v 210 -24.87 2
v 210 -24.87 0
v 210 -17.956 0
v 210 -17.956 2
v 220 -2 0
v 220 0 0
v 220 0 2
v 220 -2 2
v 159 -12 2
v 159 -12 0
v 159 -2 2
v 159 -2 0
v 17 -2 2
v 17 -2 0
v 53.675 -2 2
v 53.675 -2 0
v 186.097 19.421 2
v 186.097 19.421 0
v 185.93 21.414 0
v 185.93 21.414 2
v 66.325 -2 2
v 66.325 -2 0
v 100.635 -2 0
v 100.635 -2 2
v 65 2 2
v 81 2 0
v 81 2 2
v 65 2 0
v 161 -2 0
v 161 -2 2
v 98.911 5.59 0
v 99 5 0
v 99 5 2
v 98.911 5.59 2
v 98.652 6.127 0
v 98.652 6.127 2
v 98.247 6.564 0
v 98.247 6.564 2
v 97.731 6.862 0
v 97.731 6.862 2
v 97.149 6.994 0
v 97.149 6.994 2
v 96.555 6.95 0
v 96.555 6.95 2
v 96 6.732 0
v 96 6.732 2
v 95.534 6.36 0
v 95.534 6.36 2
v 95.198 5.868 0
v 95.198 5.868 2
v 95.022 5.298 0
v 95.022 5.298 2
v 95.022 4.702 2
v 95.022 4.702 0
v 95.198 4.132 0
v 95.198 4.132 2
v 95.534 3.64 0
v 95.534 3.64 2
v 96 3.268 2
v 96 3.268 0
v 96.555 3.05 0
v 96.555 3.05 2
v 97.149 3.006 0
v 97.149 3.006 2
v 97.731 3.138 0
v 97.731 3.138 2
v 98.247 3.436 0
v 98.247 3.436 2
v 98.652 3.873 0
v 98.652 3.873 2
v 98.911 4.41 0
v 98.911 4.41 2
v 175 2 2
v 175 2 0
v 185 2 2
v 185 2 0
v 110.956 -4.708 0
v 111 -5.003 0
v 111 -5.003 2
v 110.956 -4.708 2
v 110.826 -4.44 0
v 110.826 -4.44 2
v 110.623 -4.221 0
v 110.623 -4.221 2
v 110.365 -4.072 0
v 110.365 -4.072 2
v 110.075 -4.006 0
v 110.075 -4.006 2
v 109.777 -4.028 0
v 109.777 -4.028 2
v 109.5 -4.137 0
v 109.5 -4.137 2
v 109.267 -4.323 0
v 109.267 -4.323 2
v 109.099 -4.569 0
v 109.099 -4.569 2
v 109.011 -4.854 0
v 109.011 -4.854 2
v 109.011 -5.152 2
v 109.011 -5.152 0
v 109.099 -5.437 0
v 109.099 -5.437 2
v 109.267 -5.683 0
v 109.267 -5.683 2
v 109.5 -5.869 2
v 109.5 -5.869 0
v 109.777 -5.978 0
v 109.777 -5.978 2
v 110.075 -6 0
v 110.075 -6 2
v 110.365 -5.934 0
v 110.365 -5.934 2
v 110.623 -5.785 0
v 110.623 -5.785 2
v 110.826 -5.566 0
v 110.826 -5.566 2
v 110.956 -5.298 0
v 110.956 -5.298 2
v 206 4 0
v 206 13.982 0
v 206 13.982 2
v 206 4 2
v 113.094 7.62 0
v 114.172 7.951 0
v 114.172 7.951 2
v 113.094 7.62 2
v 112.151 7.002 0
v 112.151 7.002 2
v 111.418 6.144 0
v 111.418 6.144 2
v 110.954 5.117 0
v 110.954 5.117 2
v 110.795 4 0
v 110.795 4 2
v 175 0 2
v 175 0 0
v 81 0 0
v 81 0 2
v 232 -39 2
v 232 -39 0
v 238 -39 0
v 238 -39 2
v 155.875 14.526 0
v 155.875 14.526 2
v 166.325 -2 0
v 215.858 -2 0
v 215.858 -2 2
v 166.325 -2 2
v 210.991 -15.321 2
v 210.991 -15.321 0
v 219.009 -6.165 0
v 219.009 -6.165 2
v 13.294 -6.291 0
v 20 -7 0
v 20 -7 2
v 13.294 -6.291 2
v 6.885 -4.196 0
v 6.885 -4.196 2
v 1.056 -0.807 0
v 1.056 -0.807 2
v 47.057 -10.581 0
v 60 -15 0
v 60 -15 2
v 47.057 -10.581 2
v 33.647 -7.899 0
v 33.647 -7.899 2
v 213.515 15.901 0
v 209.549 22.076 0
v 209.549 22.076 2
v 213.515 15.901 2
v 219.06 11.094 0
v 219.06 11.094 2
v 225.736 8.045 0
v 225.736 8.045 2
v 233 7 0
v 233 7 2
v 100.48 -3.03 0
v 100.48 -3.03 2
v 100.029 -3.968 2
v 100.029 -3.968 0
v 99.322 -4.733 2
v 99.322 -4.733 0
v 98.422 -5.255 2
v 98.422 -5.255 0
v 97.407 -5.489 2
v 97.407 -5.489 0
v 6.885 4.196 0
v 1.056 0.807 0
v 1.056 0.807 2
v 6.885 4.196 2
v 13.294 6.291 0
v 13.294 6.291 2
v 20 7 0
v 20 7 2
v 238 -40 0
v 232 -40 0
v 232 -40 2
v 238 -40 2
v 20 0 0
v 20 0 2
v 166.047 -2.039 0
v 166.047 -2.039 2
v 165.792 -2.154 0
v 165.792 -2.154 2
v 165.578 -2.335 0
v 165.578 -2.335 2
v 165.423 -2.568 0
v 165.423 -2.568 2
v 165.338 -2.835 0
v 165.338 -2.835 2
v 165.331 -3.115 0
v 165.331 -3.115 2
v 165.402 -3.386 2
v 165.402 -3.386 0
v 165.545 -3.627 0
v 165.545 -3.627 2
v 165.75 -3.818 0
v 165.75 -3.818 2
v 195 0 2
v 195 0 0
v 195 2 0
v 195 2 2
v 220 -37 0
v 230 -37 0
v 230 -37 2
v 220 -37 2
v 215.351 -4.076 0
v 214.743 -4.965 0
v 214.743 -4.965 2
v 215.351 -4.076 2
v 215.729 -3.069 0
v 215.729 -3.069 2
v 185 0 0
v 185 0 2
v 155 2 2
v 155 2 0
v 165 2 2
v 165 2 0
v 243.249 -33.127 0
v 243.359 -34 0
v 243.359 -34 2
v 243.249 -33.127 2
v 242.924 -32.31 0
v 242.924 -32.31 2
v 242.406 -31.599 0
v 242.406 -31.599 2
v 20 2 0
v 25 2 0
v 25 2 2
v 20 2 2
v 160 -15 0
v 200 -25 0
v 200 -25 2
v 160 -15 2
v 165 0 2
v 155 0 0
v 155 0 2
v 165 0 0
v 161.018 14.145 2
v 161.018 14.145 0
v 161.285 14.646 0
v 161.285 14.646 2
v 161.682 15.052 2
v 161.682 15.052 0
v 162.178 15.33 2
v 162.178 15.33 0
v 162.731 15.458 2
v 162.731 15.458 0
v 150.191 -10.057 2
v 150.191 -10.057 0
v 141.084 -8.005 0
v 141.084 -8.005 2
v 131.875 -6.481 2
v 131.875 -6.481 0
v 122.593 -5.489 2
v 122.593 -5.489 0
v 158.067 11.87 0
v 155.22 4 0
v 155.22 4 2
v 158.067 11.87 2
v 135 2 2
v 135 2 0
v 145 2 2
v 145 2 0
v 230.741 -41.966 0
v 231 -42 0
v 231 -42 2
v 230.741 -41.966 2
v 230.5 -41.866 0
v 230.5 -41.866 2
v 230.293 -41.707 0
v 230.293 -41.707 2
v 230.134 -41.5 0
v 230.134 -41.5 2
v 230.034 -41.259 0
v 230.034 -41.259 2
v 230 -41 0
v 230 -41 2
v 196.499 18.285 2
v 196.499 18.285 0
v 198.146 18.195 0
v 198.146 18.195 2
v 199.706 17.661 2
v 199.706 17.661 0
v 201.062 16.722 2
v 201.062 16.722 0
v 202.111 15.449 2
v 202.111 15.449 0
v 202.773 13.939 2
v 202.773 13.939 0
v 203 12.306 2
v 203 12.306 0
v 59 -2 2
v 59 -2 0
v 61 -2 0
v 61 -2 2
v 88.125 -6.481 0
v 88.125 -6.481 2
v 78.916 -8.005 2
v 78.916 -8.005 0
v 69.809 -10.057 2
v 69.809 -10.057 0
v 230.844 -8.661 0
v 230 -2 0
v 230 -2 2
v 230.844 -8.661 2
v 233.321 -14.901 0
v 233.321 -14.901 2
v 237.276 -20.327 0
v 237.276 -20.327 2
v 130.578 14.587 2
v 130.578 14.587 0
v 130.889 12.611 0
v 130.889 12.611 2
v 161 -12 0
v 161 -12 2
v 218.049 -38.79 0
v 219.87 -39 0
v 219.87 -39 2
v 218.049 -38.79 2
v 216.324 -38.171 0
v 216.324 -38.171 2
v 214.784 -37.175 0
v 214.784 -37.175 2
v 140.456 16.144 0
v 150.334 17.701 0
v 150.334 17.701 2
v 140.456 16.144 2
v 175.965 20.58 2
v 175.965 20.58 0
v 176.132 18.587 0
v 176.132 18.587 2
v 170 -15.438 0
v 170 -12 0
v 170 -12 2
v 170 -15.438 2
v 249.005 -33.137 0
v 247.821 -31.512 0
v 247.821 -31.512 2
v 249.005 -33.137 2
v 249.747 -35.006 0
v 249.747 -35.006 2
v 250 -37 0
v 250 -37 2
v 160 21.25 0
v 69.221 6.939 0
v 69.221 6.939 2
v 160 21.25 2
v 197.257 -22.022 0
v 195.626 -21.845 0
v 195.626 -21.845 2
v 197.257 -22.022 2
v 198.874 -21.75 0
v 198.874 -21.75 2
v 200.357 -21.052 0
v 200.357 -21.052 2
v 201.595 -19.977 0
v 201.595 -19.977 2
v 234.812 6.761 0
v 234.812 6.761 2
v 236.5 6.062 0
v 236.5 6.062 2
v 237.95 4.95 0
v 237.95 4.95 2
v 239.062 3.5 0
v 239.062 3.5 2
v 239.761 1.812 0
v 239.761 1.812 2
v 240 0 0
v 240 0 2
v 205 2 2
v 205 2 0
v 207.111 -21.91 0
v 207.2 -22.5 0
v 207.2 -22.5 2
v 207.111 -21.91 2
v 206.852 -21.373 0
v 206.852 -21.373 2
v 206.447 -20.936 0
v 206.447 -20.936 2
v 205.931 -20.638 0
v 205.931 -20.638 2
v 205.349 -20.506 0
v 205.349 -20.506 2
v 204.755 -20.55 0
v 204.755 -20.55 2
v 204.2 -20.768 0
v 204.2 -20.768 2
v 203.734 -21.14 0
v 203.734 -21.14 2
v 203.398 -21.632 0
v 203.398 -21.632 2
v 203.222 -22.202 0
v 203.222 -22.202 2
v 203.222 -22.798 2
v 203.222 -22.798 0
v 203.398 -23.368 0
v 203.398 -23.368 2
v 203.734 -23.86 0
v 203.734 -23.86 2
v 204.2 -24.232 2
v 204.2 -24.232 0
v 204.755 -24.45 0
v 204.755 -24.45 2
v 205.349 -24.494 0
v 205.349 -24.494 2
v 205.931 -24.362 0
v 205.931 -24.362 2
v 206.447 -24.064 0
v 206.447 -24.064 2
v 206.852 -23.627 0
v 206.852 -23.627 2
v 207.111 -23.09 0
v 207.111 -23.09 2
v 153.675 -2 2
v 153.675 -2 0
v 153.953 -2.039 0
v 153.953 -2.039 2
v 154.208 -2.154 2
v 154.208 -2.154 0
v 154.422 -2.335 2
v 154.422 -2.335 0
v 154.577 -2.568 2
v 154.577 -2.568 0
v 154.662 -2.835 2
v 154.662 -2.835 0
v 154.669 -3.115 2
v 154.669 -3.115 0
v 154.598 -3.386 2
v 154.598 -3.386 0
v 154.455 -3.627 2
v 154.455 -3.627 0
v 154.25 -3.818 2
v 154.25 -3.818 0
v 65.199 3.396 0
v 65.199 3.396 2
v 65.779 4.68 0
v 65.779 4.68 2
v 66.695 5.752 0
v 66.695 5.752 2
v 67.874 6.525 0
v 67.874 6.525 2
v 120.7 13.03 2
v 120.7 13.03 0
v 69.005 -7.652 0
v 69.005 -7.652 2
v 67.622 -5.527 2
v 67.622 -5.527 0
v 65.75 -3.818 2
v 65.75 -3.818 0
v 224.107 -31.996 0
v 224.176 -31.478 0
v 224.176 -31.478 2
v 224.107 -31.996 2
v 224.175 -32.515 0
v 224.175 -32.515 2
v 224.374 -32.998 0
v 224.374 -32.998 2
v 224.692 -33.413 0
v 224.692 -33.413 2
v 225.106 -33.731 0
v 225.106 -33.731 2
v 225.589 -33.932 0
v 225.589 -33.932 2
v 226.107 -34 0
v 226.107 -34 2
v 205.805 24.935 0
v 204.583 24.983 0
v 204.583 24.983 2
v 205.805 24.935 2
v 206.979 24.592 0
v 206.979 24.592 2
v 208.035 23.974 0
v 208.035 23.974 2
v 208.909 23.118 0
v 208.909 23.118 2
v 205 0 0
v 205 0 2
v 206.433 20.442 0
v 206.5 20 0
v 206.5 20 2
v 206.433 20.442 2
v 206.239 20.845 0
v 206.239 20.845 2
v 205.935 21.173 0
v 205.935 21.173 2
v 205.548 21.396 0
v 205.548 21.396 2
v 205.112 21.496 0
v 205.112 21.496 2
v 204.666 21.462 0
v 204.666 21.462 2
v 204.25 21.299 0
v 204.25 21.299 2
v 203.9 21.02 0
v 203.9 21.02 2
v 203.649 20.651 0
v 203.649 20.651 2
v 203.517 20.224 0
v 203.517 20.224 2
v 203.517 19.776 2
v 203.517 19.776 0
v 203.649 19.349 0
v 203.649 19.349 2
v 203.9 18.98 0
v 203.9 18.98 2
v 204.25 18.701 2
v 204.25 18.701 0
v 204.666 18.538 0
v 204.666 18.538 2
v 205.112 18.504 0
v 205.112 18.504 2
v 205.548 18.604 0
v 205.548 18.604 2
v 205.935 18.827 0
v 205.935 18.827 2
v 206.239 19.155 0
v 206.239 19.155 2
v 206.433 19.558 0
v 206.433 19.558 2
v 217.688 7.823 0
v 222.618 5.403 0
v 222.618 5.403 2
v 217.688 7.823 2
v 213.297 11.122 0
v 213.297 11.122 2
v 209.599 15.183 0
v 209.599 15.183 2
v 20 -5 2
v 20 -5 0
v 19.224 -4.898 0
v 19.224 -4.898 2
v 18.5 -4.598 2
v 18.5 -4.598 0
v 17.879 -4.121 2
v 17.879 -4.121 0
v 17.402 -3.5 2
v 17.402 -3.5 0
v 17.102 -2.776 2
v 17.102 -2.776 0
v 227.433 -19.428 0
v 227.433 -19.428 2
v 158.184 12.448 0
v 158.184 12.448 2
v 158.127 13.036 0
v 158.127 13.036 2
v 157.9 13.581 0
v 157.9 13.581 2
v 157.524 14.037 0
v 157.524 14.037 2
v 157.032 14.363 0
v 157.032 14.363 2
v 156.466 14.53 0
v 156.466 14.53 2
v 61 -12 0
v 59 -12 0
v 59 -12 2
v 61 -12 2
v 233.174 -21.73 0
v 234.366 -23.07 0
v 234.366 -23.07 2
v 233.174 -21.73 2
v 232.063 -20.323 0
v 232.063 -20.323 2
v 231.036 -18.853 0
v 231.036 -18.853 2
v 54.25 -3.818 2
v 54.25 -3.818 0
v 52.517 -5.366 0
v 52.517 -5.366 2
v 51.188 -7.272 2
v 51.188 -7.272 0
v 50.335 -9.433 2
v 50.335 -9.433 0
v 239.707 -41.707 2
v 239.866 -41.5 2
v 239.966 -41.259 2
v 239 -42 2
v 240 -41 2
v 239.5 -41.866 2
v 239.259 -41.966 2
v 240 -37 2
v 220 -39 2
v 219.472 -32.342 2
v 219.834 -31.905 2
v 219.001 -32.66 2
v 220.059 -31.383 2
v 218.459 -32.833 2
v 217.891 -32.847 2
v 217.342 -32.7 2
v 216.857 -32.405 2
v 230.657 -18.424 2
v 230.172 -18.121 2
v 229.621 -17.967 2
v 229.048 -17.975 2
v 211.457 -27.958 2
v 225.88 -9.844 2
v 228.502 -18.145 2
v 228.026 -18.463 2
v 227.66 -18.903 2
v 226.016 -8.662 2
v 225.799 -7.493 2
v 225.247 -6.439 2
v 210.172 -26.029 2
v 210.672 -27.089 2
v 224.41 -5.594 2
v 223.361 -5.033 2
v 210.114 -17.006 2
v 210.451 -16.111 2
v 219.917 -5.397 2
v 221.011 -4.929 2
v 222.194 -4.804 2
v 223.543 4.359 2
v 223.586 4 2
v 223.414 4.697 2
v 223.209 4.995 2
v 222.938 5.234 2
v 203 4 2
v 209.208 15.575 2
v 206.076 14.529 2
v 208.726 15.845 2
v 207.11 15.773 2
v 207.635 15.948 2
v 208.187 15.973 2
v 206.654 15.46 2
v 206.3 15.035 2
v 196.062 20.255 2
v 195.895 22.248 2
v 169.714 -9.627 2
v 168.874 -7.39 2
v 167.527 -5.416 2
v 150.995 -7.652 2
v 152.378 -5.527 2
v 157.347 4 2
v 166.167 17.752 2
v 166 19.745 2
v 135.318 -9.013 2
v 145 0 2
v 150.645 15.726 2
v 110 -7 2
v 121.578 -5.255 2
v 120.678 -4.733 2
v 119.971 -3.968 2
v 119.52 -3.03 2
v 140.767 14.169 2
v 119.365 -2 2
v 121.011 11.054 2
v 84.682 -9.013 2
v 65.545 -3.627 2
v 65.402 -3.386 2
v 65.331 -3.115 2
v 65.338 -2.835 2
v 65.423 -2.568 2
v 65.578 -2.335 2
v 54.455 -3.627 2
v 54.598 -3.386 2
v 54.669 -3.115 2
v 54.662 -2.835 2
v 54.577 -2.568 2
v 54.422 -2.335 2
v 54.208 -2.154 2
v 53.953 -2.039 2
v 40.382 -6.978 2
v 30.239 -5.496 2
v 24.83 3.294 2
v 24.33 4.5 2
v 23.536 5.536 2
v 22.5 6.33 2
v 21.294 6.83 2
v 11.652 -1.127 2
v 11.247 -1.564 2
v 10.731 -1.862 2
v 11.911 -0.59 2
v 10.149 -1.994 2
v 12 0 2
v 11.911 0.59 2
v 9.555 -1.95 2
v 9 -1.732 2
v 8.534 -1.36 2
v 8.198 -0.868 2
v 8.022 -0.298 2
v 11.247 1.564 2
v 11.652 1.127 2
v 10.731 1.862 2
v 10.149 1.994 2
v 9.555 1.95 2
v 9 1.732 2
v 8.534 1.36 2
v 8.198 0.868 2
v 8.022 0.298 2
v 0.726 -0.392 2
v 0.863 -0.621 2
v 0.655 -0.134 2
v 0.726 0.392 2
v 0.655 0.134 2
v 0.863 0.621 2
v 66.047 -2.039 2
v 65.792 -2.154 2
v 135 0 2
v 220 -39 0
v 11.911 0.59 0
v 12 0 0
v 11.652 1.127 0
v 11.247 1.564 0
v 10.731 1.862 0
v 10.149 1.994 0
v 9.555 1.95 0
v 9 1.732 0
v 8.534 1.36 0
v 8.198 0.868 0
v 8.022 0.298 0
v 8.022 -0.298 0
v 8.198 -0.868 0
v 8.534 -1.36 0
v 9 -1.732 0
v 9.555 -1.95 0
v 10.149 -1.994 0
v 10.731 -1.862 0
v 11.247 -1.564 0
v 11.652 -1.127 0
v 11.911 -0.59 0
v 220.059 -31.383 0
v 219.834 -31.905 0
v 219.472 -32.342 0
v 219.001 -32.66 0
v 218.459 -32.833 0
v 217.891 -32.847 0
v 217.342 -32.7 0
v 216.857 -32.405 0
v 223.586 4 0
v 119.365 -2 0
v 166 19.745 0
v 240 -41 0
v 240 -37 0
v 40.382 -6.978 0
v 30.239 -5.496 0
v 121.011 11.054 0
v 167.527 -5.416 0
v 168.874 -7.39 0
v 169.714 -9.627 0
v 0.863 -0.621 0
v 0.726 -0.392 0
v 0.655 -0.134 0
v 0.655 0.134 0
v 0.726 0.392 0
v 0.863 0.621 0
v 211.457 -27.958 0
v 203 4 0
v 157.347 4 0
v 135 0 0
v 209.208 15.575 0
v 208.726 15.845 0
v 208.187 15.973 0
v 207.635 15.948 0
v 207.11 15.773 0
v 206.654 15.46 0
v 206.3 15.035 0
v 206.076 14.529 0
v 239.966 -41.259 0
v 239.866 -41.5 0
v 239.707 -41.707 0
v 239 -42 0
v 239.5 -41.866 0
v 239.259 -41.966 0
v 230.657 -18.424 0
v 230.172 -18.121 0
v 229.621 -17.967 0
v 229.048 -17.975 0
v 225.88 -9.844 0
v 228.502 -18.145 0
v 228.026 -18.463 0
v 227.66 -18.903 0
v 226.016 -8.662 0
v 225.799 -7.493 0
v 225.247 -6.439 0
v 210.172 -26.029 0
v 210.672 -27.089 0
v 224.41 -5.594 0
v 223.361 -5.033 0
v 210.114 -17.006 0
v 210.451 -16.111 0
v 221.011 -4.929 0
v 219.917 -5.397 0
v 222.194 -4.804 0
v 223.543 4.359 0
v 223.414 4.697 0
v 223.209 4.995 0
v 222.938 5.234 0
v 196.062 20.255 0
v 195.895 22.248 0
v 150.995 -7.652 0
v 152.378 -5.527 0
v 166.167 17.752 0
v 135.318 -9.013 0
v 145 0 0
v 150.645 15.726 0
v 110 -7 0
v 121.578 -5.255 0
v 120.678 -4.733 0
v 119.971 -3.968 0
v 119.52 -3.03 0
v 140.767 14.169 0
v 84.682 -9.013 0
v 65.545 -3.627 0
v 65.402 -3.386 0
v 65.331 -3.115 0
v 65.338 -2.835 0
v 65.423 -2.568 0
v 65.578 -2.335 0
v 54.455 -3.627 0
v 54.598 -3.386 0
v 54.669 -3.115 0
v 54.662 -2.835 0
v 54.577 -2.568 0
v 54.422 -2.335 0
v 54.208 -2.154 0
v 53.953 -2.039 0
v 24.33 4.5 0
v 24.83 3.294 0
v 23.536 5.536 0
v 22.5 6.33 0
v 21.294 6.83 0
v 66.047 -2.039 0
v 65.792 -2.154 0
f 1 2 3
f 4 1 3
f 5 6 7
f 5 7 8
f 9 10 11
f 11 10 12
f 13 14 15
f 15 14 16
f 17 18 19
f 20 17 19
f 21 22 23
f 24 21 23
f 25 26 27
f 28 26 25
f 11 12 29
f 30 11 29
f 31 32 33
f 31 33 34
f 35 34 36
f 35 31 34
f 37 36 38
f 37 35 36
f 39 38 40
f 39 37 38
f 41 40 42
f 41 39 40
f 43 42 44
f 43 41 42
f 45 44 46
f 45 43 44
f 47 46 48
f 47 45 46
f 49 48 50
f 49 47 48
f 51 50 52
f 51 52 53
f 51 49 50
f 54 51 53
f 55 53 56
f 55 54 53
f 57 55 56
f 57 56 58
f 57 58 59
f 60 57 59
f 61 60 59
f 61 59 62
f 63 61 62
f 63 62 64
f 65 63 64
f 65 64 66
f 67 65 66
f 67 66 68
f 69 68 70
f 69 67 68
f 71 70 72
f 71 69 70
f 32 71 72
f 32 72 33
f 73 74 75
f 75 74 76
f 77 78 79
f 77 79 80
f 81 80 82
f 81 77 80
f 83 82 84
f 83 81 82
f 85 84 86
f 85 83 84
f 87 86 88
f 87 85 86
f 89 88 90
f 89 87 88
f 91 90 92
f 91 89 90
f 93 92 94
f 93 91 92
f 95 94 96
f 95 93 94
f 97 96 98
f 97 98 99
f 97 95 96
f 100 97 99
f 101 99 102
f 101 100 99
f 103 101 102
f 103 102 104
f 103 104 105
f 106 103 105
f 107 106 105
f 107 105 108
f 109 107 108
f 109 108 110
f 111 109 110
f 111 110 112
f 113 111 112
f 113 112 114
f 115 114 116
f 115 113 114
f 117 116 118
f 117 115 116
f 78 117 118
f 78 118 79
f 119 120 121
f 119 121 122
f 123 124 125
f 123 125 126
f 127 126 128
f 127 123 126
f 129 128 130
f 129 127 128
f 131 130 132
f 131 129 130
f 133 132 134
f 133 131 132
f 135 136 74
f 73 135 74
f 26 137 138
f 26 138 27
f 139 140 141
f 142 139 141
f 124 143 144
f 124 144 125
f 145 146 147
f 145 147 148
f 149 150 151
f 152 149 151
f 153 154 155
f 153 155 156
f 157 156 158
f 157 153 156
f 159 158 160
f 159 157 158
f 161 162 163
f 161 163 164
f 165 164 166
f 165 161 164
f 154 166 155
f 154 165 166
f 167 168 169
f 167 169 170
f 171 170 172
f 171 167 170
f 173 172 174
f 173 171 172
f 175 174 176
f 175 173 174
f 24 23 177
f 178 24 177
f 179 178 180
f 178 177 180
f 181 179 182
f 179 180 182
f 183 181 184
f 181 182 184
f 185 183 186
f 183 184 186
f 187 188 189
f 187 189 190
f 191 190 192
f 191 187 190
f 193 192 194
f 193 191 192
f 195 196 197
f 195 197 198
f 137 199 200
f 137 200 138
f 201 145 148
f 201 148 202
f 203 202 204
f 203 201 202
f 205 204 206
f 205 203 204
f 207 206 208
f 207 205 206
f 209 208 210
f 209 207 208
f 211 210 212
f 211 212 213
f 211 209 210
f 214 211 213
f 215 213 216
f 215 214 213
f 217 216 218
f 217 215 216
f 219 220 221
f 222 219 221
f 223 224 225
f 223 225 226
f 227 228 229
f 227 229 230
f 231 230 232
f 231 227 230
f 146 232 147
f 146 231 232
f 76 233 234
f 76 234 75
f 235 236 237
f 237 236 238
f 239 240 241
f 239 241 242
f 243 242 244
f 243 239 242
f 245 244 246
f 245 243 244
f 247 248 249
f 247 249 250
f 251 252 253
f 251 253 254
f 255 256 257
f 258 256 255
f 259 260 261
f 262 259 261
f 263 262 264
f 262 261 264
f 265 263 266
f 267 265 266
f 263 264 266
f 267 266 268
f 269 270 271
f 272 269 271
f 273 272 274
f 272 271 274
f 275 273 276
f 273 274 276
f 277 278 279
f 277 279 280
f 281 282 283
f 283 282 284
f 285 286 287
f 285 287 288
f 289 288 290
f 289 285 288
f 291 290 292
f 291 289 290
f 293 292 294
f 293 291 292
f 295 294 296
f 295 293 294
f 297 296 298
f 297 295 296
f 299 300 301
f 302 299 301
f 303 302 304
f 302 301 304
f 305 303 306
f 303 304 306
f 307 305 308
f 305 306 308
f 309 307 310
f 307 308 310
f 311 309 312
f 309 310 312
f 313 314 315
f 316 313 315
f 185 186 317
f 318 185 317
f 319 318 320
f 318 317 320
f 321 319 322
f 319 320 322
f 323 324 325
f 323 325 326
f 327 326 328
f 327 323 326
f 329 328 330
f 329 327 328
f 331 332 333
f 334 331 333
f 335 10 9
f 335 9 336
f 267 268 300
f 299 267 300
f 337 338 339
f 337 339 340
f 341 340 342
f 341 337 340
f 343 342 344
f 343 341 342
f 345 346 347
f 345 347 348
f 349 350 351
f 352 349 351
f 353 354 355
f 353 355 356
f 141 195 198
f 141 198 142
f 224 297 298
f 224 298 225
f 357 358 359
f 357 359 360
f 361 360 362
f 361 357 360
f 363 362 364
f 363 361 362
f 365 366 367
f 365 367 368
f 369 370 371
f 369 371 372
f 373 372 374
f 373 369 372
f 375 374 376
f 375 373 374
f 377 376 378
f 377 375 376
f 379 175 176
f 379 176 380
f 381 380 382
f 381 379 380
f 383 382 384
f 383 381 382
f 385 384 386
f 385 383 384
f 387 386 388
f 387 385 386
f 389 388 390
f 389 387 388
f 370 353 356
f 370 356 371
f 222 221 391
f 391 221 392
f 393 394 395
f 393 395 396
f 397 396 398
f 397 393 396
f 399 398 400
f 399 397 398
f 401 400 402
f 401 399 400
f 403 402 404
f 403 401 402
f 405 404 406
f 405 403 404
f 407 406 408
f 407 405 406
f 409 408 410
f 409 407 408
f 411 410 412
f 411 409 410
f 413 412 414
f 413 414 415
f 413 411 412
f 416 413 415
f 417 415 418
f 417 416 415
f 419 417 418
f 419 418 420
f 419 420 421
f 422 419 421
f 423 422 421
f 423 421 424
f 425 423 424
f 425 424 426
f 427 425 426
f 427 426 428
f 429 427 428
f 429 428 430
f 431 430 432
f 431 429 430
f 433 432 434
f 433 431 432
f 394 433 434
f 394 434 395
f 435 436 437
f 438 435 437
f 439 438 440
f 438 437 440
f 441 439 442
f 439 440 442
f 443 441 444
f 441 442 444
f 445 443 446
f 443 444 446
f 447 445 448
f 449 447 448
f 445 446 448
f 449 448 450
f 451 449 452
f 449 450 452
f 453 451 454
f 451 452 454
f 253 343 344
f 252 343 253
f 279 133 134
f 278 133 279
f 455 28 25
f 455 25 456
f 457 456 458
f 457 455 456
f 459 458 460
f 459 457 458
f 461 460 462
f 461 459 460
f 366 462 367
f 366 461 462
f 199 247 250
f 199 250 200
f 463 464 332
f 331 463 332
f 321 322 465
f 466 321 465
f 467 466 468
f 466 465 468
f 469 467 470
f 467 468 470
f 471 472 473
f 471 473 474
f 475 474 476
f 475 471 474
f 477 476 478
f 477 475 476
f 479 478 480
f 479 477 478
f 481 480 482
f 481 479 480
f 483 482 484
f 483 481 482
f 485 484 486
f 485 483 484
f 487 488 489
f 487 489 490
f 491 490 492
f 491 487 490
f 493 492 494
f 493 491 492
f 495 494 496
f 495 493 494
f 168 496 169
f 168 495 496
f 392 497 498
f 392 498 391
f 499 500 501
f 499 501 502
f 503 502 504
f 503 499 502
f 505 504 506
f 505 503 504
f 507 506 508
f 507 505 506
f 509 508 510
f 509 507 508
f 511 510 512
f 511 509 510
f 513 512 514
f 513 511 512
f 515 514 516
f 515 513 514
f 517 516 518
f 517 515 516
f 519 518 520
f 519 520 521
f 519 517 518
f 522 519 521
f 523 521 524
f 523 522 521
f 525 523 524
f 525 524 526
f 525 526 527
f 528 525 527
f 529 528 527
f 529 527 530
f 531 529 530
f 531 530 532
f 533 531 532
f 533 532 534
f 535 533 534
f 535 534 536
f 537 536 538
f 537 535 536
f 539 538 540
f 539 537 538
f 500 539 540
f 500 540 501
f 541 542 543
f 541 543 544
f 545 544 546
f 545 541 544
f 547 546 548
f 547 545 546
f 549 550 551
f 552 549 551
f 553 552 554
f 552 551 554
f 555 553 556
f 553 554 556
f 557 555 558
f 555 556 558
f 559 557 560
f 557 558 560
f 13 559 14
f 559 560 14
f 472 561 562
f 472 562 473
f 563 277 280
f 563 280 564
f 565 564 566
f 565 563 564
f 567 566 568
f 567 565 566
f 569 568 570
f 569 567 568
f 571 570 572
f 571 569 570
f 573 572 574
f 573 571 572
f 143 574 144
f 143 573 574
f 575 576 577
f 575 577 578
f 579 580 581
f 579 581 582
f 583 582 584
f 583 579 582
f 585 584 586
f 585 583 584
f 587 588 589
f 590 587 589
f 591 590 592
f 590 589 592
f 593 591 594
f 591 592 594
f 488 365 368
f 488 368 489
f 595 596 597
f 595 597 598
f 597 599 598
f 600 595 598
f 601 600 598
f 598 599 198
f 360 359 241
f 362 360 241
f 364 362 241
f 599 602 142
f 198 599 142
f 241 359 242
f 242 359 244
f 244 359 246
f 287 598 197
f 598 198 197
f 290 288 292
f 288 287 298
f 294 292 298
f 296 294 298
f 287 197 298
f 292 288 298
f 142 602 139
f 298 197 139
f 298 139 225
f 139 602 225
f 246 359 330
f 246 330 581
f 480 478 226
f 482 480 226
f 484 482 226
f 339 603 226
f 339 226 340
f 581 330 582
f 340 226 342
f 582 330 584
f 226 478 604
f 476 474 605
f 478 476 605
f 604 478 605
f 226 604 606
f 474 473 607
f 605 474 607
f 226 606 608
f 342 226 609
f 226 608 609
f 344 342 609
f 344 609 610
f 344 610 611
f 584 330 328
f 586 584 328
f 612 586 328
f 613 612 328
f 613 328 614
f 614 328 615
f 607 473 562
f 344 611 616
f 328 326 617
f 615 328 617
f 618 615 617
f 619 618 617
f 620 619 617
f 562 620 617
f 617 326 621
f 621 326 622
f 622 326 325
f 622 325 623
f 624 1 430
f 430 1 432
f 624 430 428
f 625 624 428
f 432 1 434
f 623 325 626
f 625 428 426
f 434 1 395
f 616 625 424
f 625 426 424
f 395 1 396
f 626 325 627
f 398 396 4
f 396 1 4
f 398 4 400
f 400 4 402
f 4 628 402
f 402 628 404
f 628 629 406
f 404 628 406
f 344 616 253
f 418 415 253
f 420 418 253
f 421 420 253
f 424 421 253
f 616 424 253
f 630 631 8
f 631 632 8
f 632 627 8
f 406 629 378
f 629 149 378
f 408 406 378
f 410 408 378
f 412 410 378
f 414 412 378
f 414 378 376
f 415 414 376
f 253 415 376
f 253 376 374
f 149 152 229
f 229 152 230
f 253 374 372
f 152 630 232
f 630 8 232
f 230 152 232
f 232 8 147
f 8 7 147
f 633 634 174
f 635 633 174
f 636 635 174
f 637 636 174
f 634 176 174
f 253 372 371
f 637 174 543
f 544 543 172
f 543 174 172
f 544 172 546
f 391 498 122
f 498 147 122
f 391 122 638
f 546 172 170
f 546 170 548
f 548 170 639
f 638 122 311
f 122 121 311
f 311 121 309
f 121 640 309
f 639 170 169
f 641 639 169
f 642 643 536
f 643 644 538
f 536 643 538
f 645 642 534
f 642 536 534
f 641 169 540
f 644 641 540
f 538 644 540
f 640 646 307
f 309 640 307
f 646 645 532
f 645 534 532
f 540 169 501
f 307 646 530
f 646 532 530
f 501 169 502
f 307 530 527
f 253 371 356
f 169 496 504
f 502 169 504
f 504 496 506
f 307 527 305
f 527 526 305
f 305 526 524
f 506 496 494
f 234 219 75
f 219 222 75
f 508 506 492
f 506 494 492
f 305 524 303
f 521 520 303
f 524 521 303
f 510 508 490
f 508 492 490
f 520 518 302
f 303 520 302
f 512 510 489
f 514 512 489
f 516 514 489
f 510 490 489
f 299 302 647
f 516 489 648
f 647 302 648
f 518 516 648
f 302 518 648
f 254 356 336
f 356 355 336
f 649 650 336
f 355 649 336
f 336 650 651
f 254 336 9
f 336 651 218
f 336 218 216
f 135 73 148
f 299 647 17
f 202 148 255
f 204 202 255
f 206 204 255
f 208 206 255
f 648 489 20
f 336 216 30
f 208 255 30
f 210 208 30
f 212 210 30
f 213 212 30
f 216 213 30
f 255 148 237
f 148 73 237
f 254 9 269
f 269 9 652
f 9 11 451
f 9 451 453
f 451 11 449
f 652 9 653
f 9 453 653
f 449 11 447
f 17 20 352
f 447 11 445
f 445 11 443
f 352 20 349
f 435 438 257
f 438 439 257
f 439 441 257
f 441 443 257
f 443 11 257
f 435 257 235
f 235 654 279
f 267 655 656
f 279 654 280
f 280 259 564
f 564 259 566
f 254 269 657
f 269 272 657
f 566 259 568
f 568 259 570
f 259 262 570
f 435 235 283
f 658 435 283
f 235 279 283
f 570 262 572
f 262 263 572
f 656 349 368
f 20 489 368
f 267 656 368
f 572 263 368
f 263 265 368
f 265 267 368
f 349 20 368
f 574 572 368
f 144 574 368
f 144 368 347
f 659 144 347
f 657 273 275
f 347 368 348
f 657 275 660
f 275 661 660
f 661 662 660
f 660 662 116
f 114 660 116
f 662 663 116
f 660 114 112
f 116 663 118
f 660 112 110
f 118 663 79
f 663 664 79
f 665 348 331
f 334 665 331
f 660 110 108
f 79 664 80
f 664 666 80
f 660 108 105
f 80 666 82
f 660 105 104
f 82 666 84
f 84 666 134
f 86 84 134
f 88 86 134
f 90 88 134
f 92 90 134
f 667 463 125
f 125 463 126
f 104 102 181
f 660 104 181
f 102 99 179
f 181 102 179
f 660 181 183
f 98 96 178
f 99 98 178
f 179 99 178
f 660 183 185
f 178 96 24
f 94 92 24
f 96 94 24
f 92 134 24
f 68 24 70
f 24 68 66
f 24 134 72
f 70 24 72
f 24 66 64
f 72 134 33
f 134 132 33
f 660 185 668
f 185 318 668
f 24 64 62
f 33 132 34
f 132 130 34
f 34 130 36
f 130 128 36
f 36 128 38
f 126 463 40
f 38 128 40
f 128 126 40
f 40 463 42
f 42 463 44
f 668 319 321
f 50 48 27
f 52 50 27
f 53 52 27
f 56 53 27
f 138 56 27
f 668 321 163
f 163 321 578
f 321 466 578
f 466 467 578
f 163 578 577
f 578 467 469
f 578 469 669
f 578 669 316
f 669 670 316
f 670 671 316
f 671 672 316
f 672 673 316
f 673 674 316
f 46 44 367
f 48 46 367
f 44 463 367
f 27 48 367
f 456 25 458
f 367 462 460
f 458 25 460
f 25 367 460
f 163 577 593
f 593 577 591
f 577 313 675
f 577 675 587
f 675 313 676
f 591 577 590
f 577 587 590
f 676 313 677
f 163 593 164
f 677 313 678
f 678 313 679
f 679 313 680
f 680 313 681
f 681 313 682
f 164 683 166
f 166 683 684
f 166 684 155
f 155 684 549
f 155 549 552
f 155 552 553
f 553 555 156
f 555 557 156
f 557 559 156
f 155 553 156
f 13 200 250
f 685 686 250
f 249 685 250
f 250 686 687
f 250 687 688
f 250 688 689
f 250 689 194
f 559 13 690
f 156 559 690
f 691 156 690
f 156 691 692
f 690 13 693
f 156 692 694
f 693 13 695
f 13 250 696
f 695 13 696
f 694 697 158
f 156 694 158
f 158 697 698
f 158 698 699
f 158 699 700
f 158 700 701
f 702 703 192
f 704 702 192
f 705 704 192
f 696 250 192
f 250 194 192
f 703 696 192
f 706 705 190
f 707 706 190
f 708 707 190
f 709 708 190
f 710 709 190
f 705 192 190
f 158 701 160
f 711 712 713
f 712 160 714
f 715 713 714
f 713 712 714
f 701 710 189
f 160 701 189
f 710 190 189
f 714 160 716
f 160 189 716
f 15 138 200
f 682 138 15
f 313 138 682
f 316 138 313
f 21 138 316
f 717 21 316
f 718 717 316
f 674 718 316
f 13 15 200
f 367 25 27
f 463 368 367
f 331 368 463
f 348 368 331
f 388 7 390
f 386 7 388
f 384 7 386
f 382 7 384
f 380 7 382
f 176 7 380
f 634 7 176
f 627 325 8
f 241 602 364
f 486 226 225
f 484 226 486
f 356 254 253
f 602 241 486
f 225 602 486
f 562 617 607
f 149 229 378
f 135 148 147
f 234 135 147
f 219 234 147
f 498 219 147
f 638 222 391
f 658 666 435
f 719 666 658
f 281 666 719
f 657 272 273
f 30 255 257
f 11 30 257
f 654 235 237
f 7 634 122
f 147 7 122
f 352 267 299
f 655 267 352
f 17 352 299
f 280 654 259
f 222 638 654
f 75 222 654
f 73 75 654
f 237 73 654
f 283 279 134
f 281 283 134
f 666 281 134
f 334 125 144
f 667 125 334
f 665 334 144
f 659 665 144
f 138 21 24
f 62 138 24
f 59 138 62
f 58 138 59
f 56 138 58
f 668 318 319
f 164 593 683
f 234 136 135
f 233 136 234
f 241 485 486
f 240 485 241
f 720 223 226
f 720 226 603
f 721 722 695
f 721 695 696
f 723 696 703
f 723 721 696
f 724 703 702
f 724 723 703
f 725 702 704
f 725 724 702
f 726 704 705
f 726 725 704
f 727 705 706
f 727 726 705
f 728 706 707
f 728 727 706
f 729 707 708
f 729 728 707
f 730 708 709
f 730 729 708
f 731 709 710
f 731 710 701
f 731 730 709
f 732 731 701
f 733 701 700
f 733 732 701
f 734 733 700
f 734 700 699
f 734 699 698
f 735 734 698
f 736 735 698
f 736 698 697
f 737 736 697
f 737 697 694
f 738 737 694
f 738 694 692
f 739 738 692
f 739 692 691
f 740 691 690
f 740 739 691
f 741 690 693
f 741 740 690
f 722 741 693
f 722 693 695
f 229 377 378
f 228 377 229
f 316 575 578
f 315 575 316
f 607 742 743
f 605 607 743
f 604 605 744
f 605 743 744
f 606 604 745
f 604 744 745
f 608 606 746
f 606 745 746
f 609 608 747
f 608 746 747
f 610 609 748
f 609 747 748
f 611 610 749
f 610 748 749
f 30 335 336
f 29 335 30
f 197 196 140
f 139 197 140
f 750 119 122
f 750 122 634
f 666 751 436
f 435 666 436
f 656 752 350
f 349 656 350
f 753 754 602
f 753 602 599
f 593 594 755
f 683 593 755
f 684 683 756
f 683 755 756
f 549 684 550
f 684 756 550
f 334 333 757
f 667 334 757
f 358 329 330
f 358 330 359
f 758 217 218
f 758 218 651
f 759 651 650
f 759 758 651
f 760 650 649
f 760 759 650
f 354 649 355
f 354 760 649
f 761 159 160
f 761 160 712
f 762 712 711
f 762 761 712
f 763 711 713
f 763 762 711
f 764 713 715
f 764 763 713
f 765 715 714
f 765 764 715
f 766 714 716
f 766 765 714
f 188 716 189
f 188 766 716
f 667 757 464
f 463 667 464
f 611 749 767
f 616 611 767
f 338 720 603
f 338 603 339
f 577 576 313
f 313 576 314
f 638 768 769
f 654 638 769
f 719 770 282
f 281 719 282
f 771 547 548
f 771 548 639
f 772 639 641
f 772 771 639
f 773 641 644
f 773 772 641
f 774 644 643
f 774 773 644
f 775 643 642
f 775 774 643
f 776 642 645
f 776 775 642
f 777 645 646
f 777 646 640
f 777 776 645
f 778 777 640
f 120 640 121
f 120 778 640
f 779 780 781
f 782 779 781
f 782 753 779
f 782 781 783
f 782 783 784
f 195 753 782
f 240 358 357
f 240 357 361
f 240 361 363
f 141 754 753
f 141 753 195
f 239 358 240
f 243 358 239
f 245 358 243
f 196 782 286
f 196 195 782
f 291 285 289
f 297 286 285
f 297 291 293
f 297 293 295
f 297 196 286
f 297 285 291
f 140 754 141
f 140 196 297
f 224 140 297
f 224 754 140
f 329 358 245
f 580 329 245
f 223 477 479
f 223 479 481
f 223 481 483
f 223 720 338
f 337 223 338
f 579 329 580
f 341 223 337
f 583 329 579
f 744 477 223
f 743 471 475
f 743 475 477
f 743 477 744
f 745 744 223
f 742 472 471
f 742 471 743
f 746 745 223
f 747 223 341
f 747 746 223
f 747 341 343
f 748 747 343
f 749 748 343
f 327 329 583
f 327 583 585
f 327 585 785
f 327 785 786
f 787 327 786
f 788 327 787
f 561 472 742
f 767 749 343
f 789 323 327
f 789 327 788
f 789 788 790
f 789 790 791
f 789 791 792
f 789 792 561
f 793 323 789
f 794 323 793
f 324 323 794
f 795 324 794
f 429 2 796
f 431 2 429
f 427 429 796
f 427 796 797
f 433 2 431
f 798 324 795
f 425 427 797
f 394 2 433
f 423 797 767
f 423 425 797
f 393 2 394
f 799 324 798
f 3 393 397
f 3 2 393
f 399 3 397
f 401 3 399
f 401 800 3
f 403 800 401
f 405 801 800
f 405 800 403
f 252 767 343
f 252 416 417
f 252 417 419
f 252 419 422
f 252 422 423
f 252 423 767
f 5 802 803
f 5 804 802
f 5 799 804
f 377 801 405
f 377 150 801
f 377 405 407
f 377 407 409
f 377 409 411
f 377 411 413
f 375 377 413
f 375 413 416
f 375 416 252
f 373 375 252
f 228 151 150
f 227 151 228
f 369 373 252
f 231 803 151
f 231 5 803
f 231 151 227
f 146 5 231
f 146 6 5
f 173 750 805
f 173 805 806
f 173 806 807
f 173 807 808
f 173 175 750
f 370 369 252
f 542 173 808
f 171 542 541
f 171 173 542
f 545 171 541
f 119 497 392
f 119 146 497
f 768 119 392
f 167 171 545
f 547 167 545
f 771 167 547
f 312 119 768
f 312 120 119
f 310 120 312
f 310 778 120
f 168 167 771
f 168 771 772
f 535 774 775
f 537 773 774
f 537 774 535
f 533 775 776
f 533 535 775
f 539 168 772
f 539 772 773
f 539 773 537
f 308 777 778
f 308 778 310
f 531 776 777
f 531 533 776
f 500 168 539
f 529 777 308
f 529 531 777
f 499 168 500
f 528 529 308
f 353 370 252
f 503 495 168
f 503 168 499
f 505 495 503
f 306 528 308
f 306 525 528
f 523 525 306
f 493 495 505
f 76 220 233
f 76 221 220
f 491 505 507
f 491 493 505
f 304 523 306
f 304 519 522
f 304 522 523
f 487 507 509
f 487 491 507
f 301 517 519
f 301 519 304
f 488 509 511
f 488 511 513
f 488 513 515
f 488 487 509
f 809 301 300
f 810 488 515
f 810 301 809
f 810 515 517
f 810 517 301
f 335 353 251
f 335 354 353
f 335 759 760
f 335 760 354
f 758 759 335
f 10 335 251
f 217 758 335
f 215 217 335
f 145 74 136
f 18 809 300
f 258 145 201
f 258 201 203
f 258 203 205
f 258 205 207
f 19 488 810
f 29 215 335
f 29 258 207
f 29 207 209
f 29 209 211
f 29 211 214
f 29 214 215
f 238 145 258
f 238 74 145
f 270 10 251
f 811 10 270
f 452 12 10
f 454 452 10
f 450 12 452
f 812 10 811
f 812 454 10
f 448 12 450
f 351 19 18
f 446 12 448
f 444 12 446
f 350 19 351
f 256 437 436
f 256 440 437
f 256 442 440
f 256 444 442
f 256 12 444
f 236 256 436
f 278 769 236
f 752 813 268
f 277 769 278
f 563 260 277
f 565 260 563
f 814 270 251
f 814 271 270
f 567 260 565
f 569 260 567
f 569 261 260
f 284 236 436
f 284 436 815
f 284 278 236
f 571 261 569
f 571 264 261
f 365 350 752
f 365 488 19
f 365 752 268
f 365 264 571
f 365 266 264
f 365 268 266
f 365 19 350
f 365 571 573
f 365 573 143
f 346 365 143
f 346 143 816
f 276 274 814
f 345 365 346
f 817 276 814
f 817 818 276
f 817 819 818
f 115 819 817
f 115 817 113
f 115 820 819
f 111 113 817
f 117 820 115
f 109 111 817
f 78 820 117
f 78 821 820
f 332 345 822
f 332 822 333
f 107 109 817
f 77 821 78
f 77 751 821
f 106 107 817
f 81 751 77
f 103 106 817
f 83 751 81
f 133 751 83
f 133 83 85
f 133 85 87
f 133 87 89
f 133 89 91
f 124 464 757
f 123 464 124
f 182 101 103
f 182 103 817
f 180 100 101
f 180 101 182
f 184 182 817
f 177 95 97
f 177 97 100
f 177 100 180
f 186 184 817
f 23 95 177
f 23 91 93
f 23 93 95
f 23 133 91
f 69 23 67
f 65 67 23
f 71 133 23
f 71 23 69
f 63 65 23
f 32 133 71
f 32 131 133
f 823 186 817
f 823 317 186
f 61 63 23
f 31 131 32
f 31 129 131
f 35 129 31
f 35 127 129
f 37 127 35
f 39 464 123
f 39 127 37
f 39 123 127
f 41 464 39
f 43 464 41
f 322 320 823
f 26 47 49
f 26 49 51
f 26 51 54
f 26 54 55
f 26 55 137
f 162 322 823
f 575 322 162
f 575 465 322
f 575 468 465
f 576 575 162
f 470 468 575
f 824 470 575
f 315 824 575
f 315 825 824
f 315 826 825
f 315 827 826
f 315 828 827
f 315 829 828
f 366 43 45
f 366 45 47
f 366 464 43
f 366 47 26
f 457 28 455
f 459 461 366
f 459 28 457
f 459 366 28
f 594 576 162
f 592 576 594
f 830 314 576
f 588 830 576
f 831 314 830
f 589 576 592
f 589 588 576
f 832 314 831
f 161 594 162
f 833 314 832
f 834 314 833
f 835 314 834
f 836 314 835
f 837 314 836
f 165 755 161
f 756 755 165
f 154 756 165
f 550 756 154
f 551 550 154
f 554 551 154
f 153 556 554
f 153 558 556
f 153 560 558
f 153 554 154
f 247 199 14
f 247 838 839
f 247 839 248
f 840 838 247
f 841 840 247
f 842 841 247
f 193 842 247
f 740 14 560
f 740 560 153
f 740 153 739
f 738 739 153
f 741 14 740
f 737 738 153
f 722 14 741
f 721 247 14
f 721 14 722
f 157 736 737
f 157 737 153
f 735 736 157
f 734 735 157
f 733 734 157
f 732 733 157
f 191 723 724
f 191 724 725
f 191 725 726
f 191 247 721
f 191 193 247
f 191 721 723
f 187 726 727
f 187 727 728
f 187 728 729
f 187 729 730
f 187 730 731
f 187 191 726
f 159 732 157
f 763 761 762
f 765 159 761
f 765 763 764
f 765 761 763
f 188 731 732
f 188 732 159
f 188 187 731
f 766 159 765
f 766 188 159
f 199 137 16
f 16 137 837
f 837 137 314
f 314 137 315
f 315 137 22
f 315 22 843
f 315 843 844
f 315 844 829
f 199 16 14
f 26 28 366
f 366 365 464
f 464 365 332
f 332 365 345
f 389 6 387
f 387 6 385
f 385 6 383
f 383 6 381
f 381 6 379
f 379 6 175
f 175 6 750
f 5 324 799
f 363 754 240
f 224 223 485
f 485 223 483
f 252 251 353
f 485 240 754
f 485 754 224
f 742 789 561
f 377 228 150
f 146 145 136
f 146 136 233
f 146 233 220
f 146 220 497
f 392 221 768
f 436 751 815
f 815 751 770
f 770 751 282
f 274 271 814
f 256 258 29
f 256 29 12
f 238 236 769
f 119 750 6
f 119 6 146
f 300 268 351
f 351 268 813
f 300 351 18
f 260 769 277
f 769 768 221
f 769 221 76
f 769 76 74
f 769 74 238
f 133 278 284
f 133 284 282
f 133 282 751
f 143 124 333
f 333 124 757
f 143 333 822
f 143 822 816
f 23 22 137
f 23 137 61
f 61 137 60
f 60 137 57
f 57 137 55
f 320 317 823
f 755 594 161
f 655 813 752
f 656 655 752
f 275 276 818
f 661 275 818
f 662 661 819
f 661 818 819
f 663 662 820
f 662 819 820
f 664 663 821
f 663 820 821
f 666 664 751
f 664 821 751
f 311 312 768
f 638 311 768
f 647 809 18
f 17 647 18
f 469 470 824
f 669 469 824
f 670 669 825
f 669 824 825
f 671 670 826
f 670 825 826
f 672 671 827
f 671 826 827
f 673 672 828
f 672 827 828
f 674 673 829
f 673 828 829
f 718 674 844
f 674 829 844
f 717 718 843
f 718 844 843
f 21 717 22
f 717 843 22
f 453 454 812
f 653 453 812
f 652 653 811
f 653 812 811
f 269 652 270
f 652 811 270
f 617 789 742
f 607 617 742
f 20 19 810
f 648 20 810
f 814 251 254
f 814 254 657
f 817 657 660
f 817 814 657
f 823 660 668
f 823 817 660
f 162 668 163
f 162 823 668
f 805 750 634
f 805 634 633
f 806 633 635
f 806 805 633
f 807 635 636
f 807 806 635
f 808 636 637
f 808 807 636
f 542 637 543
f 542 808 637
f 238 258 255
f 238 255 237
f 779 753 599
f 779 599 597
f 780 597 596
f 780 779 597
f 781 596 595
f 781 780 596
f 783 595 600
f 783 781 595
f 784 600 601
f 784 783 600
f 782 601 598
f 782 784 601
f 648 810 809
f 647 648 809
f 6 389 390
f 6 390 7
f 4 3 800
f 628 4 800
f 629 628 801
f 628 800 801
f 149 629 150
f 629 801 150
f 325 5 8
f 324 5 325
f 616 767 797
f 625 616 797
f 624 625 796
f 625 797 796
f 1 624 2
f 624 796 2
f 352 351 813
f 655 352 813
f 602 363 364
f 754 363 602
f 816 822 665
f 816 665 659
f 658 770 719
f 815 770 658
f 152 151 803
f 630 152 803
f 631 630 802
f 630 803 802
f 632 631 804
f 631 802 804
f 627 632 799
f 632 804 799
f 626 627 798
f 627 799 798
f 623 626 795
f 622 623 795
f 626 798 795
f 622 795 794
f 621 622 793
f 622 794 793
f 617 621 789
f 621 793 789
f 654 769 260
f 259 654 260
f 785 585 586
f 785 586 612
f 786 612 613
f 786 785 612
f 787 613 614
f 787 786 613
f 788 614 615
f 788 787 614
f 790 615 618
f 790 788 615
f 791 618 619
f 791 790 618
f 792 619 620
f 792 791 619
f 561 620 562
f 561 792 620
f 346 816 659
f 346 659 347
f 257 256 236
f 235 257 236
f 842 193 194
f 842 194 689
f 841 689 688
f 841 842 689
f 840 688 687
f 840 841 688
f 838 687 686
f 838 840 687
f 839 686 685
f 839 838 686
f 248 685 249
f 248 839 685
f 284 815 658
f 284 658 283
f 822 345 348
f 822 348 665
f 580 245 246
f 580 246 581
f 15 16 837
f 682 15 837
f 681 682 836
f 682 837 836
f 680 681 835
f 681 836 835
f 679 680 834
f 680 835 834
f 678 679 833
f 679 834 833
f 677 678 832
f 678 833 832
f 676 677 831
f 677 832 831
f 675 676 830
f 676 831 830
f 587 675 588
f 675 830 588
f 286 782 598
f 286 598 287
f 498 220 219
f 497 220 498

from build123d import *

# Parameters (mm, degrees)
SKETCH1_R           = 2
SKETCH1_R_2         = 1.5
SKETCH1_R_3         = 0.999995252
SKETCH1_W           = 2
SKETCH1_H           = 10
SKETCH1_W_2         = 6
SKETCH1_H_2         = 1
SKETCH1_W_3         = 10
SKETCH1_H_3         = 2
BOSS_EXTRUDE1_DEPTH = 2


with BuildPart() as part:
    # Sketch1 → Boss-Extrude1 (new body)
    with BuildSketch(Plane.XY):
        with BuildLine():
            Line((25, 2), (20, 2))
            Line((20, 2), (20, 0))
            Line((20, 0), (81, 0))
            Line((81, 0), (81, 2))
            Line((81, 2), (65, 2))
            ThreePointArc((65, 2), (66.199138226, 5.24860736), (69.221379911, 6.939003012))
            Line((69.221379911, 6.939003012), (160, 21.25))
            Line((160, 21.25), (204.582849115, 24.982568127))
            ThreePointArc((204.582849115, 24.982568127), (207.525828031, 24.315112137), (209.548736462, 22.075812274))
            ThreePointArc((209.548736462, 22.075812274), (219.060470979, 11.094065968), (233, 7))
            ThreePointArc((233, 7), (237.949747468, 4.949747468), (240, 0))
            Line((240, 0), (220, 0))
            Line((220, 0), (220, -2))
            Line((220, -2), (230, -2))
            ThreePointArc((230, -2), (231.885664581, -11.859196198), (237.276483238, -20.326696111))
            Line((237.276483238, -20.326696111), (247.82118659, -31.512397))
            ThreePointArc((247.82118659, -31.512397), (249.435371299, -34.047839158), (250, -37))
            Line((250, -37), (240, -37))
            Line((240, -37), (240, -41))
            ThreePointArc((240, -41), (239.707106781, -41.707106781), (239, -42))
            Line((239, -42), (231, -42))
            ThreePointArc((231, -42), (230.292893219, -41.707106781), (230, -41))
            Line((230, -41), (230, -37))
            Line((230, -37), (220.000007865, -37))
            Line((220.000007865, -37), (220.000007865, -39))
            Line((220.000007865, -39), (219.870131034, -39))
            ThreePointArc((219.870131034, -39), (217.168606934, -38.530057605), (214.784473011, -37.175441885))
            Line((214.784473011, -37.175441885), (200.000007865, -25))
            Line((200.000007865, -25), (160, -15))
            ThreePointArc((160, -15), (110, -7), (60, -15))
            ThreePointArc((60, -15), (40.396078054, -9.019609728), (20, -7))
            ThreePointArc((20, -7), (10.034517702, -5.41243098), (1.055638849, -0.806896552))
            ThreePointArc((1.055638849, -0.806896552), (0.646331624, 0), (1.055638849, 0.806896552))
            ThreePointArc((1.055638849, 0.806896552), (10.034517702, 5.41243098), (20, 7))
            ThreePointArc((20, 7), (23.535533906, 5.535533906), (25, 2))
        make_face()
        with Locations((10, 0)):
            Circle(SKETCH1_R, mode=Mode.SUBTRACT)
        with Locations((205, 20)):
            Circle(SKETCH1_R_2, mode=Mode.SUBTRACT)
        with Locations((110, -5.003081664)):
            Circle(SKETCH1_R_3, mode=Mode.SUBTRACT)
        with Locations((97, 5)):
            Circle(SKETCH1_R, mode=Mode.SUBTRACT)
        with Locations((205.2, -22.5)):
            Circle(SKETCH1_R, mode=Mode.SUBTRACT)
        with BuildLine():
            Line((66.32455532, -2), (100.63531967, -2))
            ThreePointArc((100.63531967, -2), (99.70444241, -4.376890478), (97.406972045, -5.489441931))
            ThreePointArc((97.406972045, -5.489441931), (83.509545549, -7.177146827), (69.809337188, -10.056574175))
            ThreePointArc((69.809337188, -10.056574175), (68.381496484, -6.545596578), (65.749595746, -3.818181818))
            ThreePointArc((65.749595746, -3.818181818), (65.371092731, -2.698488655), (66.32455532, -2))
        make_face(mode=Mode.SUBTRACT)
        with Locations((60, -7)):
            Rectangle(SKETCH1_W, SKETCH1_H, mode=Mode.SUBTRACT)
        with BuildLine():
            Line((17, -2), (53.67544468, -2))
            ThreePointArc((53.67544468, -2), (54.628907269, -2.698488655), (54.250404254, -3.818181818))
            ThreePointArc((54.250404254, -3.818181818), (51.797261355, -6.280290329), (50.33500013, -9.433333386))
            ThreePointArc((50.33500013, -9.433333386), (35.328622555, -6.114189089), (20, -5))
            ThreePointArc((20, -5), (17.878679656, -4.121320344), (17, -2))
        make_face(mode=Mode.SUBTRACT)
        with Locations((235, -39.5)):
            Rectangle(SKETCH1_W_2, SKETCH1_H_2, mode=Mode.SUBTRACT)
        with Locations((160, -7)):
            Rectangle(SKETCH1_W, SKETCH1_H, mode=Mode.SUBTRACT)
        with BuildLine():
            Line((170, -15.438446719), (195.626465602, -21.84506186))
            ThreePointArc((195.626465602, -21.84506186), (198.873506118, -21.75040587), (201.59533068, -19.977300424))
            Line((201.59533068, -19.977300424), (214.743385775, -4.964820224))
            ThreePointArc((214.743385775, -4.964820224), (215.570247155, -3.583733857), (215.858147077, -2))
            Line((215.858147077, -2), (166.32455532, -2))
            ThreePointArc((166.32455532, -2), (165.371092731, -2.698488655), (165.749595746, -3.818181818))
            ThreePointArc((165.749595746, -3.818181818), (168.874005788, -7.390008539), (170, -12))
            Line((170, -12), (170, -15.438446719))
        make_face(mode=Mode.SUBTRACT)
        with BuildLine():
            Line((119.36468033, -2), (153.67544468, -2))
            ThreePointArc((153.67544468, -2), (154.628907269, -2.698488655), (154.250404254, -3.818181818))
            ThreePointArc((154.250404254, -3.818181818), (151.618503516, -6.545596578), (150.190662812, -10.056574175))
            ThreePointArc((150.190662812, -10.056574175), (136.490454451, -7.177146827), (122.593027955, -5.489441931))
            ThreePointArc((122.593027955, -5.489441931), (120.29555759, -4.376890478), (119.36468033, -2))
        make_face(mode=Mode.SUBTRACT)
        with BuildLine():
            Line((225.879980597, -9.844071792), (220.058756659, -31.382600362))
            ThreePointArc((220.058756659, -31.382600362), (218.736154735, -32.766086526), (216.856615367, -32.404642783))
            Line((216.856615367, -32.404642783), (211.457170989, -27.95804153))
            ThreePointArc((211.457170989, -27.95804153), (210.382589597, -26.57746498), (210, -24.870320587))
            Line((210, -24.870320587), (210, -17.956008689))
            ThreePointArc((210, -17.956008689), (210.255911041, -16.54824526), (210.990898935, -15.320612934))
            Line((210.990898935, -15.320612934), (219.00942596, -6.165039937))
            ThreePointArc((219.00942596, -6.165039937), (223.906765634, -5.274169259), (225.879980597, -9.844071792))
        make_face(mode=Mode.SUBTRACT)
        with BuildLine():
            Line((155.22, 4), (158.067354896, 11.869573832))
            ThreePointArc((158.067354896, 11.869573832), (157.729169089, 13.823107559), (155.875224231, 14.525640207))
            Line((155.875224231, 14.525640207), (114.171743224, 7.95120241))
            ThreePointArc((114.171743224, 7.95120241), (111.753949876, 6.598885888), (110.794639295, 4))
            Line((110.794639295, 4), (155.22, 4))
        make_face(mode=Mode.SUBTRACT)
        with BuildLine():
            Line((162.73140024, 15.457687033), (196.499418938, 18.28481524))
            ThreePointArc((196.499418938, 18.28481524), (201.061804625, 16.721811294), (203, 12.305733488))
            Line((203, 12.305733488), (203, 4))
            Line((203, 4), (157.3468873, 4))
            Line((157.3468873, 4), (161.017577964, 14.145124952))
            ThreePointArc((161.017577964, 14.145124952), (161.682196092, 15.052484435), (162.73140024, 15.457687033))
        make_face(mode=Mode.SUBTRACT)
        with BuildLine():
            Line((206, 13.981517971), (206, 4))
            Line((206, 4), (223.586196304, 4))
            ThreePointArc((223.586196304, 4), (223.320669931, 4.852100267), (222.618096484, 5.402527076))
            ThreePointArc((222.618096484, 5.402527076), (215.414646092, 9.369582641), (209.598579041, 15.18341025))
            ThreePointArc((209.598579041, 15.18341025), (207.366422097, 15.878510075), (206, 13.981517971))
        make_face(mode=Mode.SUBTRACT)
        Polygon((166, 19.745335237), (175.965136254, 20.579637008), (176.131996608, 18.586609757), (166.166860354, 17.752307987), align=None, mode=Mode.SUBTRACT)
        Polygon((150.334018075, 17.701484711), (140.45601205, 16.144244533), (140.767460085, 14.168643328), (150.64546611, 15.725883506), align=None, mode=Mode.SUBTRACT)
        Polygon((121.011448036, 11.054162973), (120.7, 13.029764178), (130.578006025, 14.587004355), (130.88945406, 12.61140315), align=None, mode=Mode.SUBTRACT)
        Polygon((186.097132862, 19.420911528), (185.930272507, 21.413938779), (195.895408761, 22.24824055), (196.062269115, 20.255213299), align=None, mode=Mode.SUBTRACT)
        with BuildLine():
            Line((227.433137345, -19.428406141), (224.17644118, -31.47818195))
            ThreePointArc((224.17644118, -31.47818195), (224.519144651, -33.215805062), (226.107167967, -34))
            Line((226.107167967, -34), (243.359060381, -34))
            ThreePointArc((243.359060381, -34), (243.112035325, -32.708429631), (242.405829515, -31.599173688))
            Line((242.405829515, -31.599173688), (234.365889943, -23.070497611))
            ThreePointArc((234.365889943, -23.070497611), (232.608526335, -21.034670167), (231.035971848, -18.852929436))
            ThreePointArc((231.035971848, -18.852929436), (229.048405235, -17.975259461), (227.433137345, -19.428406141))
        make_face(mode=Mode.SUBTRACT)
        with Locations((140, 1)):
            Rectangle(SKETCH1_W_3, SKETCH1_H_3, mode=Mode.SUBTRACT)
        with Locations((160, 1)):
            Rectangle(SKETCH1_W_3, SKETCH1_H_3, mode=Mode.SUBTRACT)
        with Locations((180, 1)):
            Rectangle(SKETCH1_W_3, SKETCH1_H_3, mode=Mode.SUBTRACT)
        with Locations((200, 1)):
            Rectangle(SKETCH1_W_3, SKETCH1_H_3, mode=Mode.SUBTRACT)
    extrude(amount=BOSS_EXTRUDE1_DEPTH)


solid = part.part
